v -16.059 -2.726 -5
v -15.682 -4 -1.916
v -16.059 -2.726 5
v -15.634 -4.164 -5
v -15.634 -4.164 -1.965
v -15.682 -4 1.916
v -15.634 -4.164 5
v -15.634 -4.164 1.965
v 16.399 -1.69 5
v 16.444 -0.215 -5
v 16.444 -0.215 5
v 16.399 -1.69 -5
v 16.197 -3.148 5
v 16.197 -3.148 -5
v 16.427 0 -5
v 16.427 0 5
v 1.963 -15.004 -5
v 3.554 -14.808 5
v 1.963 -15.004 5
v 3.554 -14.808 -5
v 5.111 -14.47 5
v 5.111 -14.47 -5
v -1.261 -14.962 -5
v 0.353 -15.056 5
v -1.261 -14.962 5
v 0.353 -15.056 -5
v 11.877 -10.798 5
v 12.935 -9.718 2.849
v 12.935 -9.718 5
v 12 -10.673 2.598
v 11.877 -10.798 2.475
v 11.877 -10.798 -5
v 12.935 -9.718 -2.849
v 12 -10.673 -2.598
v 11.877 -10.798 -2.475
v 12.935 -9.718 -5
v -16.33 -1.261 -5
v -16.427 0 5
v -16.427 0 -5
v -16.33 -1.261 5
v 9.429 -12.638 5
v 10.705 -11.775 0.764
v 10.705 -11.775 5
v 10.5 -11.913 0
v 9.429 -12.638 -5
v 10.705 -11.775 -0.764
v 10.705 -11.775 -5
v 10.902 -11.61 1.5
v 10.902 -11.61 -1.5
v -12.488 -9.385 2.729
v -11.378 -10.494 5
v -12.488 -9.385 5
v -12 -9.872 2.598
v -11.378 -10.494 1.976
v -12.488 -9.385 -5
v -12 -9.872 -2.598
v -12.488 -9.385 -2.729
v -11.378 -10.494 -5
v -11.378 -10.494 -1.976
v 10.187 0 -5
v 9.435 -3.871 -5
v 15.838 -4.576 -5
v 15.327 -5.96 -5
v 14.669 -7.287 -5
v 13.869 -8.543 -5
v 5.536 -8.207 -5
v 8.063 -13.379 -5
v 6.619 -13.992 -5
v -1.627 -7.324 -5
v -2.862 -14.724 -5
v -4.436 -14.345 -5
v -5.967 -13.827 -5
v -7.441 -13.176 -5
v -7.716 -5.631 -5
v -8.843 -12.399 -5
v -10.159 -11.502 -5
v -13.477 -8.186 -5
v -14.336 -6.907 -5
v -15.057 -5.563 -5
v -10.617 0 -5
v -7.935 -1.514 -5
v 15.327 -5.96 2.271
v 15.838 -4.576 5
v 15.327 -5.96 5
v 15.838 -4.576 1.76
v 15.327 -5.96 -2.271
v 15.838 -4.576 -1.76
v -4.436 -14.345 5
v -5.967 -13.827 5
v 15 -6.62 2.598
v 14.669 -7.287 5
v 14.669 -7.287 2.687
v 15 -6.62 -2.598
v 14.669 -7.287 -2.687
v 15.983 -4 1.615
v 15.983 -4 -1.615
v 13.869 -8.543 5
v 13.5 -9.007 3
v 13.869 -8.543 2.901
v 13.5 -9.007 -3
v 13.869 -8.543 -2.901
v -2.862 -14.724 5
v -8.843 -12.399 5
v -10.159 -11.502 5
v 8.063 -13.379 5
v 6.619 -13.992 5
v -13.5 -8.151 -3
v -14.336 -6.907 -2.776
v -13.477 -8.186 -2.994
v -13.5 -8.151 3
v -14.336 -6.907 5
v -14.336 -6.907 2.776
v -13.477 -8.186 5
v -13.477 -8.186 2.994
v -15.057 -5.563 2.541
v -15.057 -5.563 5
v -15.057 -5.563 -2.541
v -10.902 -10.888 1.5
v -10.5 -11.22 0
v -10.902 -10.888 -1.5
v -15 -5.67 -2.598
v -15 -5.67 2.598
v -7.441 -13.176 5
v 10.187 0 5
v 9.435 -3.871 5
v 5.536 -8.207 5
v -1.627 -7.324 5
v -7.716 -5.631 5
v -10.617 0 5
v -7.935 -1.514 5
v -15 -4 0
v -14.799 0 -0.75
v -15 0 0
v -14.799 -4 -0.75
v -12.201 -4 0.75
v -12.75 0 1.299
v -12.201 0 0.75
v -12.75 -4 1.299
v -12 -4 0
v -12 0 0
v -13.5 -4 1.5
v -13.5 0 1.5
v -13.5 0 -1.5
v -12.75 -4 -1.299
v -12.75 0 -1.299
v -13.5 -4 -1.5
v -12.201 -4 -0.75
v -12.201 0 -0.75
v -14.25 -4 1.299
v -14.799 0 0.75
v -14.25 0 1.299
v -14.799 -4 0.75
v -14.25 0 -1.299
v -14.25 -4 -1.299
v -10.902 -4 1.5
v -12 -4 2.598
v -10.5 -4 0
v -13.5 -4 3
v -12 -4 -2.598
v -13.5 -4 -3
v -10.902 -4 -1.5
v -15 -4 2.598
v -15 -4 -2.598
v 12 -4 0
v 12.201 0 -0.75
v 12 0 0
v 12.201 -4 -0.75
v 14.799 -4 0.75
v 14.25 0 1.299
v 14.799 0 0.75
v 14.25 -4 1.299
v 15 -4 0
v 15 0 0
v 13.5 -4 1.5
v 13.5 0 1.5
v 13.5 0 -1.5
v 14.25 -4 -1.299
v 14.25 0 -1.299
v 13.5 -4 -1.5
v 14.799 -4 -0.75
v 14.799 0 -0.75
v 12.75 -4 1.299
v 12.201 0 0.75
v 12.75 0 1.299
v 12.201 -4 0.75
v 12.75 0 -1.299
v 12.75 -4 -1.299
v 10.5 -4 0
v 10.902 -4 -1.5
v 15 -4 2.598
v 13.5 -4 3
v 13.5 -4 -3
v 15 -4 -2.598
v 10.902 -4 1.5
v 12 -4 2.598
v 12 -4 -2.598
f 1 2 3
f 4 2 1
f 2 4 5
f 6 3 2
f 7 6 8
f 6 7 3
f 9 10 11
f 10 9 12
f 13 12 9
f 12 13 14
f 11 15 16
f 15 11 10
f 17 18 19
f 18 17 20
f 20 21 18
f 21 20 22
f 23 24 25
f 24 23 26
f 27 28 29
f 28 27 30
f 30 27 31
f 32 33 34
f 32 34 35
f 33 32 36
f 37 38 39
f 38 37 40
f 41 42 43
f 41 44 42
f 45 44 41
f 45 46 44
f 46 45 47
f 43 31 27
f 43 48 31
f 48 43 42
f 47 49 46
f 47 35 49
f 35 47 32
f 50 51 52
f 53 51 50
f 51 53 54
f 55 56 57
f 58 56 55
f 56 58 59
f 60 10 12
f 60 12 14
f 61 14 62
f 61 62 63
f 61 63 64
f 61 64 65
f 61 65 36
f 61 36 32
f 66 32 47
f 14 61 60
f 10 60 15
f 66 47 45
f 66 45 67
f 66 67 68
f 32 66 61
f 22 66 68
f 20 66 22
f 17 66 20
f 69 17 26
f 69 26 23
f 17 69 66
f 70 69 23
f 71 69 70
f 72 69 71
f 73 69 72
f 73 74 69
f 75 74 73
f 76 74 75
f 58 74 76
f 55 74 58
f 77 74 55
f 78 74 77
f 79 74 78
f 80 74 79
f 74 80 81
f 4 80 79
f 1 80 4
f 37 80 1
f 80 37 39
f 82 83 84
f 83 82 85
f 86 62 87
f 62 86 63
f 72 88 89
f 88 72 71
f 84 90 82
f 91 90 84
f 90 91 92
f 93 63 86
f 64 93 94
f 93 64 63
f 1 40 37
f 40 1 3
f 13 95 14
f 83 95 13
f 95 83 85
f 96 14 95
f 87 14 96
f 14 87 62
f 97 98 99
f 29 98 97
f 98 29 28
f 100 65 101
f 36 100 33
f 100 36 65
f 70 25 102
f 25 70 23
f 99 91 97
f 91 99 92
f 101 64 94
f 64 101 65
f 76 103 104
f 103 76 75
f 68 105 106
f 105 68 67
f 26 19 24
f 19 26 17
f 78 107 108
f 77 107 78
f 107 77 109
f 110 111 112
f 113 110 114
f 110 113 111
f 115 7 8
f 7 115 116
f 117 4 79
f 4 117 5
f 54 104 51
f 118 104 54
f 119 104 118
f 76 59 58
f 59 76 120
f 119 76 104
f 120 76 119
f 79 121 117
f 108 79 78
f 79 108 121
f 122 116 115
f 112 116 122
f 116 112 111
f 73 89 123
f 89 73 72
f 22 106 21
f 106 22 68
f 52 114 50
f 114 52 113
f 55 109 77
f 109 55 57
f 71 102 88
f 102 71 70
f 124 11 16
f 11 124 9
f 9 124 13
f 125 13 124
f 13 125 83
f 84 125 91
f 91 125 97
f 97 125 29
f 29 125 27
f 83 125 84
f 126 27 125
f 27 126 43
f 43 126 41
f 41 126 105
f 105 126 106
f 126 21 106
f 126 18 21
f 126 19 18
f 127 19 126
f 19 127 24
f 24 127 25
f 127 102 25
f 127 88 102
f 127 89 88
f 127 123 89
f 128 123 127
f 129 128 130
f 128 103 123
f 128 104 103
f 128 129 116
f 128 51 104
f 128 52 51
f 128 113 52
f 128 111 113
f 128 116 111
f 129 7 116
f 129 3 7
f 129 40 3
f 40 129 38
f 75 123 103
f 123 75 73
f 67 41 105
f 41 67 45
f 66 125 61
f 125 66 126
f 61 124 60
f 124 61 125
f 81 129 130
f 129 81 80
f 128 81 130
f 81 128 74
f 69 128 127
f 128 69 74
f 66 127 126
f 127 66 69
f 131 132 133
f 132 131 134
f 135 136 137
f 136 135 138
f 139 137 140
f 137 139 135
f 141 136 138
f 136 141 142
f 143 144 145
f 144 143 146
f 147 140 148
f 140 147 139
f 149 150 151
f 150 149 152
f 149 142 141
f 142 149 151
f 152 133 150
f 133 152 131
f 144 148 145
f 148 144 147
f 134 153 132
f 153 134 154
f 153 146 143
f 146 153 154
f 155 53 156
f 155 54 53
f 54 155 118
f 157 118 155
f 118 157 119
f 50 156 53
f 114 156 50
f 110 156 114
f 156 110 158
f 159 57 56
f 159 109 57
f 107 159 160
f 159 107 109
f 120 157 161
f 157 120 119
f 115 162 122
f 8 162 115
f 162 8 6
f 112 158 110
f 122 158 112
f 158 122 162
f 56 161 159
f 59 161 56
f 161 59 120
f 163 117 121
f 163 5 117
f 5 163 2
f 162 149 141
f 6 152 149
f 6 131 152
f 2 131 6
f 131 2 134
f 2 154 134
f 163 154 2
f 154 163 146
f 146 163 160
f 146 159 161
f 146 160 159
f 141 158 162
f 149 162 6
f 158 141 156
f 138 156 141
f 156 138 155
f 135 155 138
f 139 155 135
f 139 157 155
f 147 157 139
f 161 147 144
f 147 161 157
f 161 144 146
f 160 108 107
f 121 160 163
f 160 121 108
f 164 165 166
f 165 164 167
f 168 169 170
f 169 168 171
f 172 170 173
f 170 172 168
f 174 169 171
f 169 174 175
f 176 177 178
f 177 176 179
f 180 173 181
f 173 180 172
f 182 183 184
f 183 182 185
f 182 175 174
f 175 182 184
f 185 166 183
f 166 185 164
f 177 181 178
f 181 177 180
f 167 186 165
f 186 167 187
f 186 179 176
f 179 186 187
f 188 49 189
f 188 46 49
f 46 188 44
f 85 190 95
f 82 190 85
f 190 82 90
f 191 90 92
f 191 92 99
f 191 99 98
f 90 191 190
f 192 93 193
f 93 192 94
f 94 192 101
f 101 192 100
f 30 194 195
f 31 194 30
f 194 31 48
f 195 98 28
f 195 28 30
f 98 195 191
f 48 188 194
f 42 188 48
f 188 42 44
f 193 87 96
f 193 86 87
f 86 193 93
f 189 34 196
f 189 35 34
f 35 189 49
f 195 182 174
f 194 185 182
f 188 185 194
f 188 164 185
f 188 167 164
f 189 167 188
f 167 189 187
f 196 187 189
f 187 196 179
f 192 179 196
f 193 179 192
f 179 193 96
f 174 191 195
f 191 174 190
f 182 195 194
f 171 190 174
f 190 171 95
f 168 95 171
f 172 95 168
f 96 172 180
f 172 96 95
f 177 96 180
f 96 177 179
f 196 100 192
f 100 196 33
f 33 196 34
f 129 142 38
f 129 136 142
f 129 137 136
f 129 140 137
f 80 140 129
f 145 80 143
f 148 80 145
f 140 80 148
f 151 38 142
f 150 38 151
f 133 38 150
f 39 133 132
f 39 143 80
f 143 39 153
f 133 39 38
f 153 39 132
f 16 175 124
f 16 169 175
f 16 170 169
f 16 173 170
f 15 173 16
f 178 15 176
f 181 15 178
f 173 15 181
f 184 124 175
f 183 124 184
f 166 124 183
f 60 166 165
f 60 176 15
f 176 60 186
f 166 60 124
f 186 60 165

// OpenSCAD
// file: motor_holder.scad
module motor_base_plate(a=55,b=55,thick=3,d=10)
{
  minkowski()
  {
    difference()
    {
      cube([a-d,b-d,thick/2],center=true);
      // reduce unused material
      if(0)
      for(i=[-1:2:1])
      translate([50*i,-48,0])
        rotate([0,0,45*i])
          cube([100,100,thick/2+0.001],center=true);
    }
    // round edges
    cylinder(d=d,h=thick/2,$fn=32,center=true);
  }
}

module motor_spacer()
{
  spacer_len=21;
  d1=4.5; // inner dia
  d2=10;   // outer dia
  difference()
  {
    cylinder(d=d2,h=spacer_len,$fn=32);
    translate([0,0,-0.001])
      cylinder(d=d1,h=spacer_len+0.002,$fn=32);
  }
}

module motor_box()
{
screw_len = 9.5;
thick=3; // thickness of the holder
translate([0,0,screw_len-8-21.5])
  difference()
  {
    motor_base_plate(thick=40);
    // inside cut
    translate([0,0,-0.01])
    motor_base_plate(a=45,b=45,thick=41,d=7);
    // angular cut, print faster
    translate([-10-45/2,0,0])
      rotate([0,-45,0])
      cube([40,60,100],center=true);
  }
}

module motor_holder()
{
// coordinates for mounting screws
mountscrew_pos = [[-34,5,0],[0,-32,0],[34,5,0]];
motor_center = [0,0,0];
screw_len = 9.5;
thick=3; // thickness of the holder
d_mixer_hole=34; // should be ok for parts to go freely

// mount screws
if(0)
%for(i=[0:2])
  translate(mountscrew_pos[i])
    cylinder(d=4,h=screw_len,$fn=12);

translate([0,0,screw_len-8])
  difference()
  {
    motor_base_plate();
    // axis hole
    translate(motor_center)
      rotate([0,0,360/16])
      cylinder(d=d_mixer_hole,h=thick+0.001,$fn=8,center=true);
    // motor mounting 4 holes M3-thru
    translate(motor_center)
      for(i=[0:3])
        rotate([0,0,90*i])
          translate([-31.5/2,-31.5/2,0]) // motor holes positions
            cylinder(d=3.3,h=thick+0.001,$fn=12,center=true);
    // plate mounting 3 holes M4-thru
    if(0)
    for(i=[0:2])
      translate(motor_center+mountscrew_pos[i])
        cylinder(d=4.5,h=thick+0.001,$fn=12,center=true);

  }
}


if(0)
  motor_holder();

if(0)
  motor_spacer();
// file: clamp3pod.scad
// clamp for tripod "Vanguard VT-528A"

clamp_rot = [0,0,-11];
rod_pos = [-6.5,-7,0];

module contour()
{
  polygon(points=[
    [  0.0,  0.0], // desno od polukruga
    [  6.3, -0.5], // unutarnja strana blago zakrivljeni dio, skoro ravni
    [ 13.5,  0.0], // tocka na sredini zakrivljenja
    [ 16.5,  5.0], // zakrivljeniji dio
    [ 16.5,  9.0], // tocka na srediji zakrivljenja
    [ 11.0, 15.0], // ravni kosi vanjski dio
    [ -1.0, 15.0], // ravni vanjski dio
    [ -4.0, 10.5], // tocka na sredini zakrivljenja
    [ -4.0,  5.0], // zakrivljeni dio
    [ -1.0,  4.0]  // tocka na sredini polukružnog dijela
  ]);
}

module rod_profile(h=1,s=1)
{
  scale([s,s,1])
  linear_extrude(height = h, center = true, convexity = 10, scale=1)
    contour();
}

module clamp(size=1,height=10)
{
  difference()
  {
    scale([1.1*size,size,1])
    cylinder(d=30,h=height,$fn=64,center=true);
    scale([size,size,1])
    translate(rod_pos)
      rod_profile(h=height+1,s=1);
  }
}

module print_clamp_half(i=1,size=1,height=10)
{
  difference()
  {
    rotate(clamp_rot)
    clamp(size,height);
    translate([0,i*50,0])
      cube([100,100,height+1],center=true);
    for(j=[-1,1])
    translate([j*13.5*size,0,0])
    if(i > 0)
    rotate([90,0,0])
    {
      translate([0,0,-0.1])
      cylinder(d=3,h=100,$fn=12,center=false);
      translate([0,0,4])
      cylinder(d=6,h=100,$fn=12,center=false);
    }
    else
      rotate([-90,0,0])
        translate([0,0,-0.1])
        cylinder(d=1.8,h=7,$fn=12,center=false);
  }
}

/*
//size = 1.0; // small
size = 1.2; // middle
for(i=[-1,1])
  translate([0,-i])
     print_clamp_half(i,size);
*/
// main file
include <clamp3pod.scad>
include <motor_holder.scad>

// todo drill clamp screw holes deeper near reinforcement
// todo 3 holes for hall sensor
/*
size = 1.0; // small
// size = 1.2; // middle
for(i=[-1,1])
  translate([0,-i])
     print_clamp_half(i,size);
*/

motor_pos = [ -26, -30,  0];
motor_rot = [   0,  0,  45];

module motor_holder_3pod()
{
  // [[xyz pos], height],
  clamps = [
    [[0,0, -3],12],
    [[0,0,-18.5],19],
    [[0,0,-34],12],
    ];
  clamp1_rot = [180,0,0];
  difference()
  {
    union()
    {
    for(ct = clamps)
    translate(ct[0])
      rotate(clamp1_rot)
        {
              print_clamp_half(i=-1,size=1.0,height=ct[1]);
        }
    translate(motor_pos)
      rotate(motor_rot)
      {
        motor_holder();
        // holder box reinforcement
        motor_box();
      }        
    }
    if(1)
    for(ct = clamps)
    translate(ct[0])
      rotate(clamp1_rot)
      rotate(clamp_rot)
      translate(rod_pos)
          rod_profile(h=100,s=1);
  }
    
}

module motor_clamp()
{
  print_clamp_half(i=1,size=1.0);
}

//motor_holder_3pod();
motor_clamp();
